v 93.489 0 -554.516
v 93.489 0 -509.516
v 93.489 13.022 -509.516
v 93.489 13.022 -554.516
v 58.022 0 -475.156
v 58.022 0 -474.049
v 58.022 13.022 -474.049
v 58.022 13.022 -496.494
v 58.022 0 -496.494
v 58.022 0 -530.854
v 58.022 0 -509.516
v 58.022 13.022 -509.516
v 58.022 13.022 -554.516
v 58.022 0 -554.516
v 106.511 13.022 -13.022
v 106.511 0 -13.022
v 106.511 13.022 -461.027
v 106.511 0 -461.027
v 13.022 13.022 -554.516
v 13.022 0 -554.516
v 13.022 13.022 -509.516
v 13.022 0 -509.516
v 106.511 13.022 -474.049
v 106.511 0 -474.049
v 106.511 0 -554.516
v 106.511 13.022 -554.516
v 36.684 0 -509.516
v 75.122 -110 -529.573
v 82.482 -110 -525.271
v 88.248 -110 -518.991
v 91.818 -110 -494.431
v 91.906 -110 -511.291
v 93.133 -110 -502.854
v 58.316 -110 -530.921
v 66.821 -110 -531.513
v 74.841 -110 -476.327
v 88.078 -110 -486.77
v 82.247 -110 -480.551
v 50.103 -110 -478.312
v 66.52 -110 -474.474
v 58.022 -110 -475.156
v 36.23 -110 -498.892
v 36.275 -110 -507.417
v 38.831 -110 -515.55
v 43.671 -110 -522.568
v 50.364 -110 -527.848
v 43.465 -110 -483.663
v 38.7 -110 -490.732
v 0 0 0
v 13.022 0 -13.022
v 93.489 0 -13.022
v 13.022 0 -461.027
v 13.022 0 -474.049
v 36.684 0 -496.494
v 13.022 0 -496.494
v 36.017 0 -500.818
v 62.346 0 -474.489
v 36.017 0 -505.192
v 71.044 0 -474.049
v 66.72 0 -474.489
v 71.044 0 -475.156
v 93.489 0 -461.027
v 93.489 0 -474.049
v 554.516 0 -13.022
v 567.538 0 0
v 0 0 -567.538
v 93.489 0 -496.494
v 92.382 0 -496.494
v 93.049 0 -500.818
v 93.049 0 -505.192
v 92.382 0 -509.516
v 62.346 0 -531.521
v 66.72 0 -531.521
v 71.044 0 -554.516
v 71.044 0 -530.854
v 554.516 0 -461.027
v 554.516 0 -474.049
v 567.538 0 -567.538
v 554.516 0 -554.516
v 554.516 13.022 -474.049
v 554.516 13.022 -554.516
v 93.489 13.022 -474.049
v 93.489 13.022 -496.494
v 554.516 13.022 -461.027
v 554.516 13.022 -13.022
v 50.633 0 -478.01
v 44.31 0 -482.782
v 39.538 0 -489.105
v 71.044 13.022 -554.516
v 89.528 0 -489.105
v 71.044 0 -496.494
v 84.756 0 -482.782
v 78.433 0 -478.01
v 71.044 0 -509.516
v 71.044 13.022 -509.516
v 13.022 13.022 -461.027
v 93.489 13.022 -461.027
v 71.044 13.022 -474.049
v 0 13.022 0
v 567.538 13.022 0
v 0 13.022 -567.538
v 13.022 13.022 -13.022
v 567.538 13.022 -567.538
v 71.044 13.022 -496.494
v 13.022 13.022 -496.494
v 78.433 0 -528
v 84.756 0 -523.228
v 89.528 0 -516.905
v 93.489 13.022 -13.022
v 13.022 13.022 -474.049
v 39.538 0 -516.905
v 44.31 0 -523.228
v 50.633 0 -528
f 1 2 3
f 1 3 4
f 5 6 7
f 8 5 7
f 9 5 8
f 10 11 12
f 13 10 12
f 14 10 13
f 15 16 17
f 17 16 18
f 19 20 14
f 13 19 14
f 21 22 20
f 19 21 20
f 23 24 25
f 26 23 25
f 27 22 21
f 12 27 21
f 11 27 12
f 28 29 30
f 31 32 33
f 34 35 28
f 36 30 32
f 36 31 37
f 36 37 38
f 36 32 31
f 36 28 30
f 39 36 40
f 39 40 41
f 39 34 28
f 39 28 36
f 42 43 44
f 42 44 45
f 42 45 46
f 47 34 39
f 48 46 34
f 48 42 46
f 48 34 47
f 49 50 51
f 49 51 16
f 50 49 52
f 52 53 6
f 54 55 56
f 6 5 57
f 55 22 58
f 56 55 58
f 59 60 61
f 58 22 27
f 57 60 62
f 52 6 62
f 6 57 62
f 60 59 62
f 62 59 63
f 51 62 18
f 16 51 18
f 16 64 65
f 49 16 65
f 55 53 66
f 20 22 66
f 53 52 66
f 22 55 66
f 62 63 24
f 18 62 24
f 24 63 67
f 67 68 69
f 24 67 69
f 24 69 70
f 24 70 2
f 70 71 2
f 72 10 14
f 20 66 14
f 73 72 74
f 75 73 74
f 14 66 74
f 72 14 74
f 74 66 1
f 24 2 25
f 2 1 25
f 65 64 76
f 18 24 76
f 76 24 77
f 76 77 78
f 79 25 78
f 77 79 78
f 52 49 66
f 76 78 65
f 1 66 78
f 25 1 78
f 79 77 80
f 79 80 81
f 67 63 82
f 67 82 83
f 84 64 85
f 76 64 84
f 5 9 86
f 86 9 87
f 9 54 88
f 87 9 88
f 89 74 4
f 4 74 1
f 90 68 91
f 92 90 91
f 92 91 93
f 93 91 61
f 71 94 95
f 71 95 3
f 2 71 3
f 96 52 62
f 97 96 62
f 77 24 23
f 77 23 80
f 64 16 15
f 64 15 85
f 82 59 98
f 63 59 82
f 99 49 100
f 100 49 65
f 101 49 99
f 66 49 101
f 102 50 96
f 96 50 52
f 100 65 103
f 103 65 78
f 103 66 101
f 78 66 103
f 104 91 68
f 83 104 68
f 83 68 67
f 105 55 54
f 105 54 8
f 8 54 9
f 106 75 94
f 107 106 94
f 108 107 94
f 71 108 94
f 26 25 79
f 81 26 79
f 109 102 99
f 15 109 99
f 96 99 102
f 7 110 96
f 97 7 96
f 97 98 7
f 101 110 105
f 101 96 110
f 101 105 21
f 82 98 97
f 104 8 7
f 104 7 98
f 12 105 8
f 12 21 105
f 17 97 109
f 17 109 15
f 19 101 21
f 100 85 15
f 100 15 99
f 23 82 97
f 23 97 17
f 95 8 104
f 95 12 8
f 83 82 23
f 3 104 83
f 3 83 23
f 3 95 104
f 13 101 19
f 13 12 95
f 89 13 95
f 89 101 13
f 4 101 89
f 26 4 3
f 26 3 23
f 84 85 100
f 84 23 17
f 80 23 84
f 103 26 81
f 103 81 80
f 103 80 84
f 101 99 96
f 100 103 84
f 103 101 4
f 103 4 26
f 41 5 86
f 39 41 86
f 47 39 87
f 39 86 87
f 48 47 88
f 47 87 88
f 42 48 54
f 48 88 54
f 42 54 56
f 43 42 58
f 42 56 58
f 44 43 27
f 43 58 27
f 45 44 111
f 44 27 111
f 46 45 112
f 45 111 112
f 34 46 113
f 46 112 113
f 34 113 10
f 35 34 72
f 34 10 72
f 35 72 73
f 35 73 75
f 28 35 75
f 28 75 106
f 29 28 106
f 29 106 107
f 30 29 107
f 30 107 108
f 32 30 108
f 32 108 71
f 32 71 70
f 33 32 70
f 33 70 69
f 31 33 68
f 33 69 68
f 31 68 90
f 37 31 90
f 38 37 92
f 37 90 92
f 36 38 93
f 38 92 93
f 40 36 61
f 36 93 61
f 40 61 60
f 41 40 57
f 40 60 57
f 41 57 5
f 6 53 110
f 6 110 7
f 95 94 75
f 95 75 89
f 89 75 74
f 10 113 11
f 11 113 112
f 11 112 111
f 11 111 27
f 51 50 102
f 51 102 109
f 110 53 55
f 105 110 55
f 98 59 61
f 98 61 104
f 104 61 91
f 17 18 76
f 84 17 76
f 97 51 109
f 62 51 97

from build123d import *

# Parameters (mm, degrees)
SKETCH1_W           = 567.538044716
SKETCH1_H           = 567.538044716
SKETCH1_W_2         = 80.467
SKETCH1_H_2         = 448.005044716
SKETCH1_W_3         = 45
SKETCH1_H_3         = 45
SKETCH1_W_4         = 448.005044716
SKETCH1_W_5         = 22.445
SKETCH1_H_4         = 22.445
SKETCH1_H_5         = 80.467
BOSS_EXTRUDE1_DEPTH = 13.022
SKETCH2_R           = 28.6
BOSS_EXTRUDE2_DEPTH = 110


with BuildPart() as part:
    # Sketch1 → Boss-Extrude1 (new body)
    with BuildSketch(Plane(origin=(0, 0, 0), x_dir=(1, 0, 0), z_dir=(0, 1, 0))):
        with Locations((283.769022358, 283.769022358)):
            Rectangle(SKETCH1_W, SKETCH1_H)
        with Locations((53.2555, 237.024522358)):
            Rectangle(SKETCH1_W_2, SKETCH1_H_2, mode=Mode.SUBTRACT)
        with Locations((35.522, 532.016044716)):
            Rectangle(SKETCH1_W_3, SKETCH1_H_3, mode=Mode.SUBTRACT)
        with Locations((330.513522358, 237.024522358)):
            Rectangle(SKETCH1_W_4, SKETCH1_H_2, mode=Mode.SUBTRACT)
        with Locations((82.2665, 532.016044716)):
            Rectangle(SKETCH1_W_5, SKETCH1_H_3, mode=Mode.SUBTRACT)
        with Locations((35.522, 485.271544716)):
            Rectangle(SKETCH1_W_3, SKETCH1_H_4, mode=Mode.SUBTRACT)
        with Locations((330.513522358, 514.282544716)):
            Rectangle(SKETCH1_W_4, SKETCH1_H_5, mode=Mode.SUBTRACT)
        with Locations((82.2665, 485.271544716)):
            Rectangle(SKETCH1_W_5, SKETCH1_H_4, mode=Mode.SUBTRACT)
    extrude(amount=BOSS_EXTRUDE1_DEPTH)

    # Sketch2 → Boss-Extrude2 (add)
    with BuildSketch(Plane.XZ):
        with Locations(Location((64.533, -503.005044716, 0), (0, 0, 103.159188844))):
            Circle(SKETCH2_R)
    extrude(amount=BOSS_EXTRUDE2_DEPTH)


solid = part.part
